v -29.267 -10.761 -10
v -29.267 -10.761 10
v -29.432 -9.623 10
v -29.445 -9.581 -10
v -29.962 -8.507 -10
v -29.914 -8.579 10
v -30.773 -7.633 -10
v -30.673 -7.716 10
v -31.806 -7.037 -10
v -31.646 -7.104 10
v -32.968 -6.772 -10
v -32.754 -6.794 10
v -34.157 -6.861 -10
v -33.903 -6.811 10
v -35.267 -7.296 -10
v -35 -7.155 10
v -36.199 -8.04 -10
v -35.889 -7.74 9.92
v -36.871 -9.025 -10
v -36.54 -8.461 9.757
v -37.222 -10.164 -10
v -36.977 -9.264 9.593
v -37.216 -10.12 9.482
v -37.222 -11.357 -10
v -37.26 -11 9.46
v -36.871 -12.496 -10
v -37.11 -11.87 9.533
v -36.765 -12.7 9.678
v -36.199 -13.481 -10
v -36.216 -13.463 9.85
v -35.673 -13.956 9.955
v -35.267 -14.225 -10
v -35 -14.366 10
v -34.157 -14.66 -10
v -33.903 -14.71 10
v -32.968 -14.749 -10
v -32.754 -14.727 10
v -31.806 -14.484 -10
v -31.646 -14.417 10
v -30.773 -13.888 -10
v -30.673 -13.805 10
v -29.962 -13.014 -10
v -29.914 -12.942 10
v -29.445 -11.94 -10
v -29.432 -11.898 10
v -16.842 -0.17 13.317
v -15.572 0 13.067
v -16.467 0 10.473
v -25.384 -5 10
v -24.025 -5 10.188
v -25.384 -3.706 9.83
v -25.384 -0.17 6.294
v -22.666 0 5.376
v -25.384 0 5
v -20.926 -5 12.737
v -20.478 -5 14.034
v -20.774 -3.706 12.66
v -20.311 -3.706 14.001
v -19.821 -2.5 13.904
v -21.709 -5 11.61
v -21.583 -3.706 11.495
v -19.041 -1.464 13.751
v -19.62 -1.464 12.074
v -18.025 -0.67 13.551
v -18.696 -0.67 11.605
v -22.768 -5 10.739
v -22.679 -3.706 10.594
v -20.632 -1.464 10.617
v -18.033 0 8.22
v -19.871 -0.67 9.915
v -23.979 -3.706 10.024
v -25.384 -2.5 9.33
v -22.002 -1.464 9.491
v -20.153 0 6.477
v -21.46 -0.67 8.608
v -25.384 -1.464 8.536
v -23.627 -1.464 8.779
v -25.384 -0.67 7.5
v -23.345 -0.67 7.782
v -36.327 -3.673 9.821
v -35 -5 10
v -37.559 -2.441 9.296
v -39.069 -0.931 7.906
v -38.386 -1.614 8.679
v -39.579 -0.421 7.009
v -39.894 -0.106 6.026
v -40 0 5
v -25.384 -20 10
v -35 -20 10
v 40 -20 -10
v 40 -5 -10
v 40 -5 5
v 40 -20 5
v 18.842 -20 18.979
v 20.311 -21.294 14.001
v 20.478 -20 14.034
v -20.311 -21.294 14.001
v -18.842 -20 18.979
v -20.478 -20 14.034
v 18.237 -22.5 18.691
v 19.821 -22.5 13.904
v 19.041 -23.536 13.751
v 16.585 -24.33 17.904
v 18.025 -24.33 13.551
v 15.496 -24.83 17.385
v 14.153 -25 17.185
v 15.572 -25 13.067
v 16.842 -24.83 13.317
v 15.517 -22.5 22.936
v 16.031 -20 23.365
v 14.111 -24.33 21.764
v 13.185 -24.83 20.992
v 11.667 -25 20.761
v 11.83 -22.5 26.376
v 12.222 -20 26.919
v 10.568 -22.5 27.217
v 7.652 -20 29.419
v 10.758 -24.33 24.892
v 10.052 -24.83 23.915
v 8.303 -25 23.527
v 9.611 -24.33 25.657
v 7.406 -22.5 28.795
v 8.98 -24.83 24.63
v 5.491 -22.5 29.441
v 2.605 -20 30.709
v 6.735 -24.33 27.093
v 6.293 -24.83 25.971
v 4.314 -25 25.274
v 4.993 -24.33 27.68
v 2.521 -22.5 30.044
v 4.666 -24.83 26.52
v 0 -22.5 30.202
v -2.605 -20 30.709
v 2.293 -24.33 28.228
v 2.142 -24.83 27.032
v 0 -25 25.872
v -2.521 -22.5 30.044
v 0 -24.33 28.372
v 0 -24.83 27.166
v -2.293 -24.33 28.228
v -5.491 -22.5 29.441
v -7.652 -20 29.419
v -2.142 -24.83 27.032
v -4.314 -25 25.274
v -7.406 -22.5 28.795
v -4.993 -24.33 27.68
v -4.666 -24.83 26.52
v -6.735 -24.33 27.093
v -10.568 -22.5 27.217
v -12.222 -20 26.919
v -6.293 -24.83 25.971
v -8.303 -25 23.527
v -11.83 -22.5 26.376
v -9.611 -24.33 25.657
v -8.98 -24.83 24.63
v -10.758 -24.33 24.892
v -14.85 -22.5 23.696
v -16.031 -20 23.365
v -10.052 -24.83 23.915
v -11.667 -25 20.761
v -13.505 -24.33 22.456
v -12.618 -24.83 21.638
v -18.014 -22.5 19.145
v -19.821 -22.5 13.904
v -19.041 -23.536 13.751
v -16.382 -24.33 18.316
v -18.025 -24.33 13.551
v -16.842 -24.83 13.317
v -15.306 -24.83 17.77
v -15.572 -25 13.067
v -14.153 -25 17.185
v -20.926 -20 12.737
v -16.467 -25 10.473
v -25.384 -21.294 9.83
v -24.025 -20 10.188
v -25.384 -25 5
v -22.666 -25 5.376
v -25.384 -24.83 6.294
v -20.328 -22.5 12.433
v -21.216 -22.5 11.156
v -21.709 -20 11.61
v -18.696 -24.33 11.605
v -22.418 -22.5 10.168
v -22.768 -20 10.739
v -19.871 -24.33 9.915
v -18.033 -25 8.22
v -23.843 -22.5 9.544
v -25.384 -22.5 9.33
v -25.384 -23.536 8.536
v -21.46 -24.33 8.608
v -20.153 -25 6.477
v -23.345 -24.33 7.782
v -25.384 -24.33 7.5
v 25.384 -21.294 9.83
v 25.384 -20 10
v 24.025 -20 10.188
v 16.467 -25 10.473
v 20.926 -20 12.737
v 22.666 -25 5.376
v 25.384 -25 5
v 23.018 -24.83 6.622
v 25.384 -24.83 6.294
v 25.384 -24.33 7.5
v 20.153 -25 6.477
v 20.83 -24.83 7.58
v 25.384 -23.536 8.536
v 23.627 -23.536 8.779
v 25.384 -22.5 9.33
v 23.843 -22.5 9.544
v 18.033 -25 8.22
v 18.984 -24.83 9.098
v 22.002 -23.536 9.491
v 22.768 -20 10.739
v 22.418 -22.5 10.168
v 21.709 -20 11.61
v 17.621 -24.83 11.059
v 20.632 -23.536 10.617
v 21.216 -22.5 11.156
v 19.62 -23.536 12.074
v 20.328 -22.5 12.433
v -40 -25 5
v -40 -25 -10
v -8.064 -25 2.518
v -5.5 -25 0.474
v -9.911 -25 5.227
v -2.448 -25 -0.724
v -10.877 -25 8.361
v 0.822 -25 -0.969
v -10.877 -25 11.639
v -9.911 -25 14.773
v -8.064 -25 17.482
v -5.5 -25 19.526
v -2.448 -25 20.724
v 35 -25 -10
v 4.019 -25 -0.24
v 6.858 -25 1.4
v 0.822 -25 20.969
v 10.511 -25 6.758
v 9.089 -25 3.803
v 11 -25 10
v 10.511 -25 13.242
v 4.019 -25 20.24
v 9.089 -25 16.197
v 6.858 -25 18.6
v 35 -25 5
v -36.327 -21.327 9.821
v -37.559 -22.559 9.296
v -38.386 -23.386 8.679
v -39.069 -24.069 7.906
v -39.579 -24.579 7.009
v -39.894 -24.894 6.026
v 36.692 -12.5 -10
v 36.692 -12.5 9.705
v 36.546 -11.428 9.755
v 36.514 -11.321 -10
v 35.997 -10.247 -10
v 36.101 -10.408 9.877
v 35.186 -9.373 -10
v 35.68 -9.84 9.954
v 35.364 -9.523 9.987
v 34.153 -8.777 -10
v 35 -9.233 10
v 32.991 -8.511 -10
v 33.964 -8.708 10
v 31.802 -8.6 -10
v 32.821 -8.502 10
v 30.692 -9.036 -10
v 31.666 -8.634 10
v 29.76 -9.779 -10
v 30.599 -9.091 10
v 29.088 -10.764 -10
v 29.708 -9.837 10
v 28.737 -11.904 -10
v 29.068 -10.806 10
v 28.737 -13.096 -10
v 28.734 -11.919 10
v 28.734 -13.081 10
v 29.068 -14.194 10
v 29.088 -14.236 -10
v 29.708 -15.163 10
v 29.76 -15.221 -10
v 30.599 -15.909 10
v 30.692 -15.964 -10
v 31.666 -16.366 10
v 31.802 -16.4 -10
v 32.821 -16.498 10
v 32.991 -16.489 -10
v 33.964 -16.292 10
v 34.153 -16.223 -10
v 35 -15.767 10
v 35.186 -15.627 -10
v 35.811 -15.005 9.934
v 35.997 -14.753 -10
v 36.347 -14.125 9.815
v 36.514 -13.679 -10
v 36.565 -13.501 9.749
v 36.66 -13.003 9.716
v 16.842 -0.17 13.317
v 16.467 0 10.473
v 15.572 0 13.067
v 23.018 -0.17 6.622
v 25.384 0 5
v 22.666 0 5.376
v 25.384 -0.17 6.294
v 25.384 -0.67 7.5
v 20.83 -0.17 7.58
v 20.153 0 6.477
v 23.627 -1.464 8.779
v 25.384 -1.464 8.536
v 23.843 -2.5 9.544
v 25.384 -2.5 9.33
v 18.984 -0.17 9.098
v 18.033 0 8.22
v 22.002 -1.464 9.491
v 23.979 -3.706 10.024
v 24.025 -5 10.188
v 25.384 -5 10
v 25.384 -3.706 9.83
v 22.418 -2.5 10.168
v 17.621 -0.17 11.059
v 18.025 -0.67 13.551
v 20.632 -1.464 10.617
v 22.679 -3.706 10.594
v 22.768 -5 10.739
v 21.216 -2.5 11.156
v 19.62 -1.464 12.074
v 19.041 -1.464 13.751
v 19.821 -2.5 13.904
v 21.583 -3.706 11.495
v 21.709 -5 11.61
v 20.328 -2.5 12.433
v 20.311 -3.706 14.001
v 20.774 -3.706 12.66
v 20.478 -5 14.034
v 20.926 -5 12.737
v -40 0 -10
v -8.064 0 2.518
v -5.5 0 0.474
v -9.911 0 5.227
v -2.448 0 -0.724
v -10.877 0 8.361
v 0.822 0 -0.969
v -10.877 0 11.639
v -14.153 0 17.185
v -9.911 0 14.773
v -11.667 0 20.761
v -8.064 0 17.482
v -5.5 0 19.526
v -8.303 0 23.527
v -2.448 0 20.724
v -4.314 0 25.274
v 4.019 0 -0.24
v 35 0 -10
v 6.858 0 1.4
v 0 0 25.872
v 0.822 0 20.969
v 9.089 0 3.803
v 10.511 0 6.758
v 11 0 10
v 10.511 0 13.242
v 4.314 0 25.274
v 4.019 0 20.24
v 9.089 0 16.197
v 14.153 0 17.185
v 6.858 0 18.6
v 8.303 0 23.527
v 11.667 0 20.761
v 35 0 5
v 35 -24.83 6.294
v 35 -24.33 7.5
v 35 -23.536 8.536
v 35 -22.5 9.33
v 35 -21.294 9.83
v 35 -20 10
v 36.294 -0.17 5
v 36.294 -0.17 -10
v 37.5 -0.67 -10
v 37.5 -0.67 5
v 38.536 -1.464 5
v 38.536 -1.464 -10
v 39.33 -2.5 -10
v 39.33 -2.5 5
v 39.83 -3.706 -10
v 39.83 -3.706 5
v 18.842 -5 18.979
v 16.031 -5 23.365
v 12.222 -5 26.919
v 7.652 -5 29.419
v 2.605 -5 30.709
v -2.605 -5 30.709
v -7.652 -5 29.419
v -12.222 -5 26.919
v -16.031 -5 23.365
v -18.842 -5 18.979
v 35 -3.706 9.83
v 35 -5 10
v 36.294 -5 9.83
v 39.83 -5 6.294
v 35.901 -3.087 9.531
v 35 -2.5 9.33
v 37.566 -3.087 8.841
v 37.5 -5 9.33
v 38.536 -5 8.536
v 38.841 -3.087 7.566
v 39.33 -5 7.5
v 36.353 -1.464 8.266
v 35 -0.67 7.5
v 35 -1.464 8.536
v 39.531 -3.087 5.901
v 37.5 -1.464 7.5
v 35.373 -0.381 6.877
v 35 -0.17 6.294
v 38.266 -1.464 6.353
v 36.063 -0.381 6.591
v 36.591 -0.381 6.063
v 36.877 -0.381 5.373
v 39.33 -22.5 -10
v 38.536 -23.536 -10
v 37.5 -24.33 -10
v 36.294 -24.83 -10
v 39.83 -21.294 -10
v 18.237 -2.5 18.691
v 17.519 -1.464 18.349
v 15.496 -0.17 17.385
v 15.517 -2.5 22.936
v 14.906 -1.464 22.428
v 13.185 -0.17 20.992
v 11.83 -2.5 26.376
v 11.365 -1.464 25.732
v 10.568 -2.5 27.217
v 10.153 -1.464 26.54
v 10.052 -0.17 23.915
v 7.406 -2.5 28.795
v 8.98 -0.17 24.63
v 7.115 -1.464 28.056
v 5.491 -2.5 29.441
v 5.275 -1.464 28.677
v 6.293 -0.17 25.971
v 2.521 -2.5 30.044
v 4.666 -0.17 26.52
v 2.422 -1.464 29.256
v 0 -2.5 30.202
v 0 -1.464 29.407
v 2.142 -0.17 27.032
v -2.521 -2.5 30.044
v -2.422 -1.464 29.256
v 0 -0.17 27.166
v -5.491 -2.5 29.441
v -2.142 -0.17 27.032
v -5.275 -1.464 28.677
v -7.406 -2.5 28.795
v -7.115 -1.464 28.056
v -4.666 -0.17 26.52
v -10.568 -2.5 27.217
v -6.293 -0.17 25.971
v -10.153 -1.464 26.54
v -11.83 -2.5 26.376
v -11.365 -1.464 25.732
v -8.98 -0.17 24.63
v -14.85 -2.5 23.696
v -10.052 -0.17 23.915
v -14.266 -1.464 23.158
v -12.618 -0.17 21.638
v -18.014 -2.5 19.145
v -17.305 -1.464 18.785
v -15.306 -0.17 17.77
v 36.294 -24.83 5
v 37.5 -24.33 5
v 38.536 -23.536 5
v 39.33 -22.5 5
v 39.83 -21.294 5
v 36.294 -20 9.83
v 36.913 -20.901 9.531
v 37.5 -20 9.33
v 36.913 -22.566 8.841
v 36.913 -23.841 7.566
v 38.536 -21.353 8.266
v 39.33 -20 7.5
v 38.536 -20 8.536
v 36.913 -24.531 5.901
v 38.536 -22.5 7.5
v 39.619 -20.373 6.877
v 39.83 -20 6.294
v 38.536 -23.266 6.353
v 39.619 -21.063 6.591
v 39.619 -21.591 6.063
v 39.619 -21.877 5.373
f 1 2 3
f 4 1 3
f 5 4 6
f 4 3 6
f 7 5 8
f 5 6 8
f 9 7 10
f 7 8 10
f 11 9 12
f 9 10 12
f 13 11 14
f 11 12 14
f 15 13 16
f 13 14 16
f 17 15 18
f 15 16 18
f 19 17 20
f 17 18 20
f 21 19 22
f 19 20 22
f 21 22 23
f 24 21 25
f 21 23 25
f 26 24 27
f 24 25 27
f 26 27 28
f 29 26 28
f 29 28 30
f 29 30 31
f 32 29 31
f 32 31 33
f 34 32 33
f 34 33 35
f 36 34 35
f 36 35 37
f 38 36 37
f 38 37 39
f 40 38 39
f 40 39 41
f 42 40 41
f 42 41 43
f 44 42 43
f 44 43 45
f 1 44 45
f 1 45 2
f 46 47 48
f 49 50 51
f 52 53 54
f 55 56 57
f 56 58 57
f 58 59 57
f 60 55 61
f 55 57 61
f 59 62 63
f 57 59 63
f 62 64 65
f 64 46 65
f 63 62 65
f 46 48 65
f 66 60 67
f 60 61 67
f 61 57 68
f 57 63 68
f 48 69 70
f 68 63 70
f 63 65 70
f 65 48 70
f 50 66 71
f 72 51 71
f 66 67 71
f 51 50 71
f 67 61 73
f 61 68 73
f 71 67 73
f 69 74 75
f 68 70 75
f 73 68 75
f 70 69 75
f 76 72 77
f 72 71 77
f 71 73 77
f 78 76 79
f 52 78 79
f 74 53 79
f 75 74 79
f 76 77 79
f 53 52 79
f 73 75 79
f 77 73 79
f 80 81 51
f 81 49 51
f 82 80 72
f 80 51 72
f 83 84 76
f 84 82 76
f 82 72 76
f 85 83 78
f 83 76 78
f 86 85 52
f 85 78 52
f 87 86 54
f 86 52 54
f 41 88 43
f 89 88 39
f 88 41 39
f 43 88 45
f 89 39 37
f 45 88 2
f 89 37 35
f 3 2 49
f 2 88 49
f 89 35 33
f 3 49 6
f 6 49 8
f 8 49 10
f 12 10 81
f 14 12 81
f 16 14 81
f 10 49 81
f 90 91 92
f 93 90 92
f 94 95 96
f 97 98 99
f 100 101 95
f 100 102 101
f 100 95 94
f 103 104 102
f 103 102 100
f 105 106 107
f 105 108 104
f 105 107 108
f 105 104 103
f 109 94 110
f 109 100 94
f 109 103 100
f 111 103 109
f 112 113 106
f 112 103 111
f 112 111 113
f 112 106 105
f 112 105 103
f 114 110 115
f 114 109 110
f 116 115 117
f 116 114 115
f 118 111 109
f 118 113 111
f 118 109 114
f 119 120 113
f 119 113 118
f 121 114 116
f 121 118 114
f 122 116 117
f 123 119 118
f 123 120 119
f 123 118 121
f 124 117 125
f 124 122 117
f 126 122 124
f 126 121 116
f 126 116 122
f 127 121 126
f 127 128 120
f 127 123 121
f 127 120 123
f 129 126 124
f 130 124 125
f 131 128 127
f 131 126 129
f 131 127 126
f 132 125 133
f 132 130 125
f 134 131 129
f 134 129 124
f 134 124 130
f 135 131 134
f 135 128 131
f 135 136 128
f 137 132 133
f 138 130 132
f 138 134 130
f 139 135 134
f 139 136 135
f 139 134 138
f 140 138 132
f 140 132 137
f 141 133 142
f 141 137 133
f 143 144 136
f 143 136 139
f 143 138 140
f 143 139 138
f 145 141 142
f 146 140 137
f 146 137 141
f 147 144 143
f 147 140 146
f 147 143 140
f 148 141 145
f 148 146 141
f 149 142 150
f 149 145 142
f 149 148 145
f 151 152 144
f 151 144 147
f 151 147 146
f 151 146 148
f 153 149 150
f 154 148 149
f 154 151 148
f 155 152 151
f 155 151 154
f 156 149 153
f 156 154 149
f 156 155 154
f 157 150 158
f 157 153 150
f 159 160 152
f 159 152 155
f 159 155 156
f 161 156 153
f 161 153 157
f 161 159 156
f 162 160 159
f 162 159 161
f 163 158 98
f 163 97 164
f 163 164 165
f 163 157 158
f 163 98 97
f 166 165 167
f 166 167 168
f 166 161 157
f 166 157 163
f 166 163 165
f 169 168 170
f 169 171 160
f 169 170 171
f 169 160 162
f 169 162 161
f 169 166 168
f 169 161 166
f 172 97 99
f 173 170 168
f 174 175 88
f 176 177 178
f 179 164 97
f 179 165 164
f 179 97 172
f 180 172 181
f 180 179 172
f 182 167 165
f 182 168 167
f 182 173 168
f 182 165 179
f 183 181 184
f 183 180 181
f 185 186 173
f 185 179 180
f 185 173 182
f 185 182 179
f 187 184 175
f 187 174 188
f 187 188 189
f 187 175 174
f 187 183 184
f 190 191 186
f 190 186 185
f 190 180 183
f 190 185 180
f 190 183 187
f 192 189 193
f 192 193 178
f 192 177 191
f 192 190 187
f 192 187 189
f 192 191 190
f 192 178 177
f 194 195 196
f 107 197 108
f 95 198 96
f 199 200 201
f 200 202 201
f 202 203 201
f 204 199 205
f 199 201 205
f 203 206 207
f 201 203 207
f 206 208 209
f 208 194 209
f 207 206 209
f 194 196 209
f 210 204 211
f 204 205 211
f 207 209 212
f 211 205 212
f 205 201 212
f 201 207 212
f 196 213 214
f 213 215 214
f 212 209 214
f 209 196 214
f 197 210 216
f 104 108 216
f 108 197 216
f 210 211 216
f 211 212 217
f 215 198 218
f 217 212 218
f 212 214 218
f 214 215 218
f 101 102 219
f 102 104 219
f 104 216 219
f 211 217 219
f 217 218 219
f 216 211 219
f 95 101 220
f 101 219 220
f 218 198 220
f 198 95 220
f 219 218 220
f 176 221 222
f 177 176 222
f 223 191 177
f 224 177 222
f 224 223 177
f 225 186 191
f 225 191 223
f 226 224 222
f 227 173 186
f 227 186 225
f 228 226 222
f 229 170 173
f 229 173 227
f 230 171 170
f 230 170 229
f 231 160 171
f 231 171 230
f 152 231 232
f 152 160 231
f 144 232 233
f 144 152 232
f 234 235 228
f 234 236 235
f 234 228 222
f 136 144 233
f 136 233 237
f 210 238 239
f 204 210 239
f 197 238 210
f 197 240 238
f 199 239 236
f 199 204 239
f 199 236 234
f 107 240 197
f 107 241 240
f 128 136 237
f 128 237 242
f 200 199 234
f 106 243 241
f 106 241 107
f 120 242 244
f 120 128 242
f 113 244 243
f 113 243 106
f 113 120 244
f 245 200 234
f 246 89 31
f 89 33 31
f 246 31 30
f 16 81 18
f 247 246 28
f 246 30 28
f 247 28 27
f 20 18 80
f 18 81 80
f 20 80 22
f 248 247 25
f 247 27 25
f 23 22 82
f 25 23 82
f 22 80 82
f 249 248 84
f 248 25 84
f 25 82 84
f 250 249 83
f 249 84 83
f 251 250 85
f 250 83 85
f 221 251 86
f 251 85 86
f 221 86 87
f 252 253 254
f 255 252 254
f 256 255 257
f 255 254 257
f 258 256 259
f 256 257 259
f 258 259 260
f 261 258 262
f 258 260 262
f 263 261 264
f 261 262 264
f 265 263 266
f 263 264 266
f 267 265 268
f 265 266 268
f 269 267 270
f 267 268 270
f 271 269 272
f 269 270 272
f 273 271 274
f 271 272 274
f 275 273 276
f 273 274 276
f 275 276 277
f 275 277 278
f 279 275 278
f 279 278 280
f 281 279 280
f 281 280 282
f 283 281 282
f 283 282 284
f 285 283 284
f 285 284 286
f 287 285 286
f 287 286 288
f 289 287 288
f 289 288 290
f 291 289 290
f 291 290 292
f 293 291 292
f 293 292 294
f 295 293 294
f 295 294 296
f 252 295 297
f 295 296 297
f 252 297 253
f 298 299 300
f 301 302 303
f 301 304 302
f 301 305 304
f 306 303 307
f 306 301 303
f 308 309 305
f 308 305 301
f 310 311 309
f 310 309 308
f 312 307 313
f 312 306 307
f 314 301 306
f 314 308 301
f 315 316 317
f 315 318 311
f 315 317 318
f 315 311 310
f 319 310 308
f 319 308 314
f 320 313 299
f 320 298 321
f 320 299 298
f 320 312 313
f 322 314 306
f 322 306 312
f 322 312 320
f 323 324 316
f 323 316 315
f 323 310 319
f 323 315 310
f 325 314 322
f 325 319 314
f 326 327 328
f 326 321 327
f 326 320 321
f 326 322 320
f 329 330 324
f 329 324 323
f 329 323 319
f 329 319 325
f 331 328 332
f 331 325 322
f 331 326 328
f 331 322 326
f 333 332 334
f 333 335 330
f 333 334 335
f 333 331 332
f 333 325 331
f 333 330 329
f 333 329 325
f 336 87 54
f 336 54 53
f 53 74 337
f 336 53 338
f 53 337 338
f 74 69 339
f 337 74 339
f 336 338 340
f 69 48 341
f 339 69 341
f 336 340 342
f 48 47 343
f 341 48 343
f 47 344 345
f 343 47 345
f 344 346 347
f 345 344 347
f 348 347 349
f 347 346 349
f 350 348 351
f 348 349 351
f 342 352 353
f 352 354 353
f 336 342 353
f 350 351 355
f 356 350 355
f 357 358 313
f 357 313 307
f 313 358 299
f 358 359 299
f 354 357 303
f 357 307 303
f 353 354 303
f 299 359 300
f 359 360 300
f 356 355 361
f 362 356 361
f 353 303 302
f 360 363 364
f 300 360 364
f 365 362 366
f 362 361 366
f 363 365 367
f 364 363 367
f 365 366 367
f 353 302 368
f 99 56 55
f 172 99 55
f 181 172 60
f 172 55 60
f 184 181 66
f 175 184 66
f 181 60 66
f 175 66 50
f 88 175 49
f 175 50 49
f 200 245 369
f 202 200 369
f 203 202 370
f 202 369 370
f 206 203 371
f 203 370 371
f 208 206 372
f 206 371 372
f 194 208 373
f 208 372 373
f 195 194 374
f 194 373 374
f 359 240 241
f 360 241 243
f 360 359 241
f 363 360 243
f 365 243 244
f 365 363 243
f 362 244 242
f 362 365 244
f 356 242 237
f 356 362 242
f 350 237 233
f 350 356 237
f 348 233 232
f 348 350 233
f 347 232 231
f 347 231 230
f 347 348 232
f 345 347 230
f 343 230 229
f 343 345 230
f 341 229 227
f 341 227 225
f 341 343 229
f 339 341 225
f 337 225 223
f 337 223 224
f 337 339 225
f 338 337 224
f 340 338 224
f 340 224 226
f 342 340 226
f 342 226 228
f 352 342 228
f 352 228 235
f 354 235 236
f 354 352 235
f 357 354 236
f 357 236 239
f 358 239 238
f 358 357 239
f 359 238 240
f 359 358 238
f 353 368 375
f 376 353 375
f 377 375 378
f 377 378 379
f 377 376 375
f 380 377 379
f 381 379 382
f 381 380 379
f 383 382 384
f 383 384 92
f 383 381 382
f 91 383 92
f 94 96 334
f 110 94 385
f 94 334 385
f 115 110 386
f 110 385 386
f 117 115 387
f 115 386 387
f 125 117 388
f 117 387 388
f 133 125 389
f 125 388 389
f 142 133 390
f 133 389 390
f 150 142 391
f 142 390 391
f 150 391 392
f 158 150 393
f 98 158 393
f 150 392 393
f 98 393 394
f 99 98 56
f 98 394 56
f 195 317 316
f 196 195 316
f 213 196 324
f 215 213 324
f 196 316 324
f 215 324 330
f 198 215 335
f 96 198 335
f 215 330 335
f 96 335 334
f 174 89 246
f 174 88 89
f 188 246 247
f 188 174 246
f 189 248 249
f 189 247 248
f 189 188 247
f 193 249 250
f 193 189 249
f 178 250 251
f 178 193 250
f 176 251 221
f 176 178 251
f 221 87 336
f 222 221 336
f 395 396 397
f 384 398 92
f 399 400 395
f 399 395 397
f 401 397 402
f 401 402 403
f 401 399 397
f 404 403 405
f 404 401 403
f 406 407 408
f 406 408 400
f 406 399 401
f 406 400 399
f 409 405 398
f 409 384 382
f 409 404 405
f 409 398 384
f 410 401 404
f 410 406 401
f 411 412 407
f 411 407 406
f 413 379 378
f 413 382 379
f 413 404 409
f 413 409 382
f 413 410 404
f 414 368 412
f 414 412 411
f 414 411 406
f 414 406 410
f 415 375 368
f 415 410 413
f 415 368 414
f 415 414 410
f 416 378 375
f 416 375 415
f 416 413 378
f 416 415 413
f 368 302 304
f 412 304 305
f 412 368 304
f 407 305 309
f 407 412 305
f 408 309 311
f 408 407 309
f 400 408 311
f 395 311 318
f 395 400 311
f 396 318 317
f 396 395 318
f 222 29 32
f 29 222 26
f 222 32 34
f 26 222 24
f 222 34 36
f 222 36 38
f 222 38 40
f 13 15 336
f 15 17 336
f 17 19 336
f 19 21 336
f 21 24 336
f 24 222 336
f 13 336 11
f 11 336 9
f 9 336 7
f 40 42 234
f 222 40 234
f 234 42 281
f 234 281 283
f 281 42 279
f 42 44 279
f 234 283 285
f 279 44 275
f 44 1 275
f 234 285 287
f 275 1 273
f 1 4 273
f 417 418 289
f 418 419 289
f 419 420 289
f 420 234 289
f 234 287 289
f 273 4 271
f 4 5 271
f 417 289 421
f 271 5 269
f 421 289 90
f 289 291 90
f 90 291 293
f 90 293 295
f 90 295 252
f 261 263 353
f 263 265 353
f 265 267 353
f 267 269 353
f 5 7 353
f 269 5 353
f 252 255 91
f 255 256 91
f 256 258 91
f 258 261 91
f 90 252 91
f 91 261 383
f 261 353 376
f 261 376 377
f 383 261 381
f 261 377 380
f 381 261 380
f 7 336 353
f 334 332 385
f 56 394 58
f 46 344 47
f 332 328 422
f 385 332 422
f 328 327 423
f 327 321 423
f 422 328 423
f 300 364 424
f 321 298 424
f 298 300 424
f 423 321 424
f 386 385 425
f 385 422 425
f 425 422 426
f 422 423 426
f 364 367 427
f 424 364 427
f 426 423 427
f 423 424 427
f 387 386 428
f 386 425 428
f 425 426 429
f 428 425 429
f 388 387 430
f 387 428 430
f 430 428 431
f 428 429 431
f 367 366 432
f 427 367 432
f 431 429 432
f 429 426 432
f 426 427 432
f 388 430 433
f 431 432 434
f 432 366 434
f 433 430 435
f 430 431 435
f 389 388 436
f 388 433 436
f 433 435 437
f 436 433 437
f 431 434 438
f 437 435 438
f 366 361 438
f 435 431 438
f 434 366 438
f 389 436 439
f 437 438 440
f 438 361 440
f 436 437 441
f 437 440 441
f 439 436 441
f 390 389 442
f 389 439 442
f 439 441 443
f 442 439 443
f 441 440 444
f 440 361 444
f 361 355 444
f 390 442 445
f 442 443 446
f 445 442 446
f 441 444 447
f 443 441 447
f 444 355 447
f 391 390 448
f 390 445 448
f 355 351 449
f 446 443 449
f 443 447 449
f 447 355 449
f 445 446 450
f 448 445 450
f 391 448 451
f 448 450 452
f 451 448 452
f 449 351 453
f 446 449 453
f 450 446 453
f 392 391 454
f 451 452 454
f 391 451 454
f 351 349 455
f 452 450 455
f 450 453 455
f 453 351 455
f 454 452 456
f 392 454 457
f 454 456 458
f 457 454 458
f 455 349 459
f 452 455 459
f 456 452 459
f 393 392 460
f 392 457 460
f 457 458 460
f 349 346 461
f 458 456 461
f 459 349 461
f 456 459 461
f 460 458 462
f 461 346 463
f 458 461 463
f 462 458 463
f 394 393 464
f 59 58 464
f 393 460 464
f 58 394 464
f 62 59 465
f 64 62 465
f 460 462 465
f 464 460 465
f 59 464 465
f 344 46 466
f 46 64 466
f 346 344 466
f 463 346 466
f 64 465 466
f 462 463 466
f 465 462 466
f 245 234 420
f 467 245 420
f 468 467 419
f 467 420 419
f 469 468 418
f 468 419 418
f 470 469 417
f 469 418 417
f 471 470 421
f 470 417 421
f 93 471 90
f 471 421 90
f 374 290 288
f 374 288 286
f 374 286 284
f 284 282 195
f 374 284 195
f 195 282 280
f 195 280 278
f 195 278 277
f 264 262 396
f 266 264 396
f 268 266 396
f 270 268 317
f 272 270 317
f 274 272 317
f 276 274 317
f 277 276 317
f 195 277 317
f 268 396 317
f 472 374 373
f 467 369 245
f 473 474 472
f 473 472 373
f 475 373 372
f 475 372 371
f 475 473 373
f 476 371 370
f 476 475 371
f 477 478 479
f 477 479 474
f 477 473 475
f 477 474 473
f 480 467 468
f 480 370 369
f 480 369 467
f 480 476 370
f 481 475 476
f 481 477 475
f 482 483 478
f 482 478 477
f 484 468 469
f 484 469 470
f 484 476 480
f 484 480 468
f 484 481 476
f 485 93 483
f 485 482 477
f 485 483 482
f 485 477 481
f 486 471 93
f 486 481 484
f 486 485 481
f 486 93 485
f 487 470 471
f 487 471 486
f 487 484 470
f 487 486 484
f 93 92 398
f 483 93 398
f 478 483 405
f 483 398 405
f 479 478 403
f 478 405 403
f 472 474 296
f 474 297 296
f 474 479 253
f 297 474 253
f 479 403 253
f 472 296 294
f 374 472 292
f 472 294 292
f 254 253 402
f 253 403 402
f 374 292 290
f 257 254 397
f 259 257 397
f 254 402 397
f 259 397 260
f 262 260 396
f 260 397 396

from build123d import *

# Parameters (mm, degrees)
F0_R         = 11
F1_DEPTH     = 25
F2_R         = 4
F4_DEPTH     = 25
F3_R         = 4
F5_DEPTH     = 25
F6_S2_W      = 5
F6_S2_H      = 5
F6_T3_DEPTH  = 5
F6_T8_ANGLE  = 157.7136601513
F6_T11_DEPTH = 32.5
F6_T14_DEPTH = 27.5
F6_T17_ANGLE = 157.7136601513
F6_T20_DEPTH = 50
F6_T23_ANGLE = 78.8568300757
F6_T26_ANGLE = 78.8568300757
F6_T29_DEPTH = 27.1160389937
F6_T32_DEPTH = 27.1160389937
F6_T35_ANGLE = 78.8568300757
F6_T38_ANGLE = 78.8568300757
F6_T41_DEPTH = 27.1160389937
F6_T44_DEPTH = 9.6160389937
F7_T1_DEPTH  = 27.5
F7_S5_W      = 5
F7_S5_H      = 5
F7_T6_DEPTH  = 5


# Not quite as in the source:
# - a fillet or chamfer that OpenCascade refuses, or shapes differently, is made with other operations: its cross-section is extruded or revolved along the edge and cut away or added


with BuildPart() as f1:
    # F0 (on Front) → F1 (new body)
    with BuildSketch(Plane.XZ):
        with BuildLine():
            Line((-40, 10), (-40, -10))
            Line((-40, -10), (40, -10))
            Line((40, -10), (40, 10))
            Line((40, 10), (25.3839610063, 10))
            ThreePointArc((25.3839610063, 10), (22.2083926988, 11.137906536), (20.4782243644, 14.0336936303))
            ThreePointArc((20.4782243644, 14.0336936303), (0, 30.8717118949), (-20.4782243644, 14.0336936303))
            ThreePointArc((-20.4782243644, 14.0336936303), (-22.2083926988, 11.137906536), (-25.3839610063, 10))
            Line((-25.3839610063, 10), (-40, 10))
        make_face()
        with Locations((0, 10)):
            Circle(F0_R, mode=Mode.SUBTRACT)
    extrude(amount=F1_DEPTH)

    # F2 (on face) → F4 (cut)
    with BuildSketch(Plane.XY.offset(10)):
        with Locations((32.6919805032, -12.5)):
            Circle(F2_R)
    extrude(amount=-F4_DEPTH, mode=Mode.SUBTRACT)

    # F3 (on face) → F5 (cut)
    with BuildSketch(Plane.XY.offset(10)):
        with Locations((-33.267121762, -10.7605047524)):
            Circle(F3_R)
    extrude(amount=-F5_DEPTH, mode=Mode.SUBTRACT)

    # F6: fillet of radius 5 on 5 edges, made by hand


with BuildPart() as f6_tool1:
    # F6_s2 → F6_t3 (new body)
    with BuildSketch(Plane.YZ.offset(35)):
        with Locations((-22.5, 7.5)):
            Rectangle(F6_S2_W, F6_S2_H)
    extrude(amount=F6_T3_DEPTH)

    # F6_s4 → F6_t5 (revolve, cut)
    with BuildSketch(Plane(origin=(35, -20, 5), x_dir=(0, 0.7071067812, -0.7071067812), z_dir=(0, -0.7071067812, -0.7071067812))):
        with BuildLine():
            ThreePointArc((0, -5), (5, 0), (0, 5))
            Line((0, 5), (0, -5))
        make_face()
    revolve(axis=Axis((35, -20, 5), (1, 0, 0)), mode=Mode.SUBTRACT)


with BuildPart() as f6_tool6:
    # F6_s7 → F6_t8 (revolve)
    with BuildSketch(Plane(origin=(-1.8961778261, 0, 9.6265007999), x_dir=(0, 1, 0), z_dir=(0.1932612739, 0, -0.9811473284))):
        with BuildLine():
            ThreePointArc((-20, 22.8043246343), (-23.5355339059, 21.3398585403), (-25, 17.8043246343))
            Line((-25, 17.8043246343), (-25, 22.8043246343))
            Line((-25, 22.8043246343), (-20, 22.8043246343))
        make_face()
    revolve(axis=Axis((0, -25, 10), (0, -1, 0)), revolution_arc=F6_T8_ANGLE)


with BuildPart() as f6_tool9:
    # F6_s10 → F6_t11 (new body)
    with BuildSketch(Plane.XZ.offset(-12.5)):
        with BuildLine():
            ThreePointArc((40, 5), (38.5355339059, 8.5355339059), (35, 10))
            Line((35, 10), (40, 10))
            Line((40, 10), (40, 5))
        make_face()
    extrude(amount=F6_T11_DEPTH)


with BuildPart() as f6_tool12:
    # F6_s13 → F6_t14 (new body)
    with BuildSketch(Plane.XY.offset(-22.5)):
        with BuildLine():
            ThreePointArc((35, -25), (38.5355339059, -23.5355339059), (40, -20))
            Line((40, -20), (40, -25))
            Line((40, -25), (35, -25))
        make_face()
    extrude(amount=F6_T14_DEPTH)


with BuildPart() as f6_tool15:
    # F6_s16 → F6_t17 (revolve)
    with BuildSketch(Plane(origin=(-1.8961778261, 0, 9.6265007999), x_dir=(0, 1, 0), z_dir=(0.1932612739, 0, -0.9811473284))):
        with BuildLine():
            ThreePointArc((-5, 22.8043246343), (-1.4644660941, 21.3398585403), (0, 17.8043246343))
            Line((0, 17.8043246343), (0, 22.8043246343))
            Line((0, 22.8043246343), (-5, 22.8043246343))
        make_face()
    revolve(axis=Axis((0, 0, 10), (0, -1, 0)), revolution_arc=F6_T17_ANGLE)


with BuildPart() as f6_tool18:
    # F6_s19 → F6_t20 (new body)
    with BuildSketch(Plane.XZ.offset(-12.5)):
        with BuildLine():
            ThreePointArc((-35, 10), (-38.5355339059, 8.5355339059), (-40, 5))
            Line((-40, 5), (-40, 10))
            Line((-40, 10), (-35, 10))
        make_face()
    extrude(amount=F6_T20_DEPTH)


with BuildPart() as f6_tool21:
    # F6_s22 → F6_t23 (revolve)
    with BuildSketch(Plane.YZ.offset(25.3839610063)):
        with BuildLine():
            ThreePointArc((0, 5), (-1.4644660941, 8.5355339059), (-5, 10))
            Line((-5, 10), (0, 10))
            Line((0, 10), (0, 5))
        make_face()
    revolve(axis=Axis((25.3839610063, 0, 15), (0, 1, 0)), revolution_arc=F6_T23_ANGLE)


with BuildPart() as f6_tool24:
    # F6_s25 → F6_t26 (revolve)
    with BuildSketch(Plane(origin=(1.8961778261, 0, 9.6265007999), x_dir=(0, 1, 0), z_dir=(0.1932612739, 0, 0.9811473284))):
        with BuildLine():
            ThreePointArc((-5, 22.8043246343), (-1.4644660941, 21.3398585403), (0, 17.8043246343))
            Line((0, 17.8043246343), (0, 22.8043246343))
            Line((0, 22.8043246343), (-5, 22.8043246343))
        make_face()
    revolve(axis=Axis((-25.3839610063, 0, 15), (0, 1, 0)), revolution_arc=F6_T26_ANGLE)


with BuildPart() as f6_tool27:
    # F6_s28 → F6_t29 (new body)
    with BuildSketch(Plane.YZ.offset(-25.3839610063)):
        with BuildLine():
            ThreePointArc((-5, 10), (-1.4644660941, 8.5355339059), (0, 5))
            Line((0, 5), (0, 10))
            Line((0, 10), (-5, 10))
        make_face()
    extrude(amount=-F6_T29_DEPTH)


with BuildPart() as f6_tool30:
    # F6_s31 → F6_t32 (new body)
    with BuildSketch(Plane.YZ.offset(52.5)):
        with BuildLine():
            ThreePointArc((0, 5), (-1.4644660941, 8.5355339059), (-5, 10))
            Line((-5, 10), (0, 10))
            Line((0, 10), (0, 5))
        make_face()
    extrude(amount=-F6_T32_DEPTH)


with BuildPart() as f6_tool33:
    # F6_s34 → F6_t35 (revolve)
    with BuildSketch(Plane.YZ.offset(25.3839610063)):
        with BuildLine():
            ThreePointArc((-25, 5), (-23.5355339059, 8.5355339059), (-20, 10))
            Line((-20, 10), (-25, 10))
            Line((-25, 10), (-25, 5))
        make_face()
    revolve(axis=Axis((25.3839610063, -25, 15), (0, 1, 0)), revolution_arc=F6_T35_ANGLE)


with BuildPart() as f6_tool36:
    # F6_s37 → F6_t38 (revolve)
    with BuildSketch(Plane(origin=(1.8961778261, 0, 9.6265007999), x_dir=(0, 1, 0), z_dir=(0.1932612739, 0, 0.9811473284))):
        with BuildLine():
            ThreePointArc((-20, 22.8043246343), (-23.5355339059, 21.3398585403), (-25, 17.8043246343))
            Line((-25, 17.8043246343), (-25, 22.8043246343))
            Line((-25, 22.8043246343), (-20, 22.8043246343))
        make_face()
    revolve(axis=Axis((-25.3839610063, -25, 15), (0, 1, 0)), revolution_arc=F6_T38_ANGLE)


with BuildPart() as f6_tool39:
    # F6_s40 → F6_t41 (new body)
    with BuildSketch(Plane.YZ.offset(-25.3839610063)):
        with BuildLine():
            ThreePointArc((-20, 10), (-23.5355339059, 8.5355339059), (-25, 5))
            Line((-25, 5), (-25, 10))
            Line((-25, 10), (-20, 10))
        make_face()
    extrude(amount=-F6_T41_DEPTH)


with BuildPart() as f6_tool42:
    # F6_s43 → F6_t44 (new body)
    with BuildSketch(Plane.YZ.offset(35)):
        with BuildLine():
            ThreePointArc((-25, 5), (-23.5355339059, 8.5355339059), (-20, 10))
            Line((-20, 10), (-25, 10))
            Line((-25, 10), (-25, 5))
        make_face()
    extrude(amount=-F6_T44_DEPTH)


with BuildPart() as f1_1:
    add(f1.part)

    # F6_t45: cut F6_tool1, F6_tool6, F6_tool9, F6_tool12, F6_tool15, F6_tool18, F6_tool21, F6_tool24, F6_tool27, F6_tool30, F6_tool33, F6_tool36, F6_tool39, F6_tool42
    add([f6_tool1.part, f6_tool6.part, f6_tool9.part, f6_tool12.part, f6_tool15.part, f6_tool18.part, f6_tool21.part, f6_tool24.part, f6_tool27.part, f6_tool30.part, f6_tool33.part, f6_tool36.part, f6_tool39.part, f6_tool42.part], mode=Mode.SUBTRACT)

    # F7: fillet of radius 5 on 1 edges, made by hand

    # F7_s2 → F7_t1 (cut)
    with BuildSketch(Plane.XY.offset(-22.5)):
        with BuildLine():
            ThreePointArc((35, 0), (38.5355339059, -1.4644660941), (40, -5))
            Line((40, -5), (40, 0))
            Line((40, 0), (35, 0))
        make_face()
    extrude(amount=F7_T1_DEPTH, mode=Mode.SUBTRACT)


with BuildPart() as f7_tool4:
    # F7_s5 → F7_t6 (new body)
    with BuildSketch(Plane.XZ.offset(5)):
        with Locations((37.5, 7.5)):
            Rectangle(F7_S5_W, F7_S5_H)
    extrude(amount=-F7_T6_DEPTH)

    # F7_s7 → F7_t8 (revolve, cut)
    with BuildSketch(Plane(origin=(35, -5, 5), x_dir=(-0.7071067812, 0, -0.7071067812), z_dir=(0.7071067812, 0, -0.7071067812))):
        with BuildLine():
            ThreePointArc((0, -5), (5, 0), (0, 5))
            Line((0, 5), (0, -5))
        make_face()
    revolve(axis=Axis((35, -5, 5), (0, 1, 0)), mode=Mode.SUBTRACT)


with BuildPart() as f1_2:
    add(f1_1.part)

    # F7_t3: cut F7_tool4
    add(f7_tool4.part, mode=Mode.SUBTRACT)


solid = f1_2.part
